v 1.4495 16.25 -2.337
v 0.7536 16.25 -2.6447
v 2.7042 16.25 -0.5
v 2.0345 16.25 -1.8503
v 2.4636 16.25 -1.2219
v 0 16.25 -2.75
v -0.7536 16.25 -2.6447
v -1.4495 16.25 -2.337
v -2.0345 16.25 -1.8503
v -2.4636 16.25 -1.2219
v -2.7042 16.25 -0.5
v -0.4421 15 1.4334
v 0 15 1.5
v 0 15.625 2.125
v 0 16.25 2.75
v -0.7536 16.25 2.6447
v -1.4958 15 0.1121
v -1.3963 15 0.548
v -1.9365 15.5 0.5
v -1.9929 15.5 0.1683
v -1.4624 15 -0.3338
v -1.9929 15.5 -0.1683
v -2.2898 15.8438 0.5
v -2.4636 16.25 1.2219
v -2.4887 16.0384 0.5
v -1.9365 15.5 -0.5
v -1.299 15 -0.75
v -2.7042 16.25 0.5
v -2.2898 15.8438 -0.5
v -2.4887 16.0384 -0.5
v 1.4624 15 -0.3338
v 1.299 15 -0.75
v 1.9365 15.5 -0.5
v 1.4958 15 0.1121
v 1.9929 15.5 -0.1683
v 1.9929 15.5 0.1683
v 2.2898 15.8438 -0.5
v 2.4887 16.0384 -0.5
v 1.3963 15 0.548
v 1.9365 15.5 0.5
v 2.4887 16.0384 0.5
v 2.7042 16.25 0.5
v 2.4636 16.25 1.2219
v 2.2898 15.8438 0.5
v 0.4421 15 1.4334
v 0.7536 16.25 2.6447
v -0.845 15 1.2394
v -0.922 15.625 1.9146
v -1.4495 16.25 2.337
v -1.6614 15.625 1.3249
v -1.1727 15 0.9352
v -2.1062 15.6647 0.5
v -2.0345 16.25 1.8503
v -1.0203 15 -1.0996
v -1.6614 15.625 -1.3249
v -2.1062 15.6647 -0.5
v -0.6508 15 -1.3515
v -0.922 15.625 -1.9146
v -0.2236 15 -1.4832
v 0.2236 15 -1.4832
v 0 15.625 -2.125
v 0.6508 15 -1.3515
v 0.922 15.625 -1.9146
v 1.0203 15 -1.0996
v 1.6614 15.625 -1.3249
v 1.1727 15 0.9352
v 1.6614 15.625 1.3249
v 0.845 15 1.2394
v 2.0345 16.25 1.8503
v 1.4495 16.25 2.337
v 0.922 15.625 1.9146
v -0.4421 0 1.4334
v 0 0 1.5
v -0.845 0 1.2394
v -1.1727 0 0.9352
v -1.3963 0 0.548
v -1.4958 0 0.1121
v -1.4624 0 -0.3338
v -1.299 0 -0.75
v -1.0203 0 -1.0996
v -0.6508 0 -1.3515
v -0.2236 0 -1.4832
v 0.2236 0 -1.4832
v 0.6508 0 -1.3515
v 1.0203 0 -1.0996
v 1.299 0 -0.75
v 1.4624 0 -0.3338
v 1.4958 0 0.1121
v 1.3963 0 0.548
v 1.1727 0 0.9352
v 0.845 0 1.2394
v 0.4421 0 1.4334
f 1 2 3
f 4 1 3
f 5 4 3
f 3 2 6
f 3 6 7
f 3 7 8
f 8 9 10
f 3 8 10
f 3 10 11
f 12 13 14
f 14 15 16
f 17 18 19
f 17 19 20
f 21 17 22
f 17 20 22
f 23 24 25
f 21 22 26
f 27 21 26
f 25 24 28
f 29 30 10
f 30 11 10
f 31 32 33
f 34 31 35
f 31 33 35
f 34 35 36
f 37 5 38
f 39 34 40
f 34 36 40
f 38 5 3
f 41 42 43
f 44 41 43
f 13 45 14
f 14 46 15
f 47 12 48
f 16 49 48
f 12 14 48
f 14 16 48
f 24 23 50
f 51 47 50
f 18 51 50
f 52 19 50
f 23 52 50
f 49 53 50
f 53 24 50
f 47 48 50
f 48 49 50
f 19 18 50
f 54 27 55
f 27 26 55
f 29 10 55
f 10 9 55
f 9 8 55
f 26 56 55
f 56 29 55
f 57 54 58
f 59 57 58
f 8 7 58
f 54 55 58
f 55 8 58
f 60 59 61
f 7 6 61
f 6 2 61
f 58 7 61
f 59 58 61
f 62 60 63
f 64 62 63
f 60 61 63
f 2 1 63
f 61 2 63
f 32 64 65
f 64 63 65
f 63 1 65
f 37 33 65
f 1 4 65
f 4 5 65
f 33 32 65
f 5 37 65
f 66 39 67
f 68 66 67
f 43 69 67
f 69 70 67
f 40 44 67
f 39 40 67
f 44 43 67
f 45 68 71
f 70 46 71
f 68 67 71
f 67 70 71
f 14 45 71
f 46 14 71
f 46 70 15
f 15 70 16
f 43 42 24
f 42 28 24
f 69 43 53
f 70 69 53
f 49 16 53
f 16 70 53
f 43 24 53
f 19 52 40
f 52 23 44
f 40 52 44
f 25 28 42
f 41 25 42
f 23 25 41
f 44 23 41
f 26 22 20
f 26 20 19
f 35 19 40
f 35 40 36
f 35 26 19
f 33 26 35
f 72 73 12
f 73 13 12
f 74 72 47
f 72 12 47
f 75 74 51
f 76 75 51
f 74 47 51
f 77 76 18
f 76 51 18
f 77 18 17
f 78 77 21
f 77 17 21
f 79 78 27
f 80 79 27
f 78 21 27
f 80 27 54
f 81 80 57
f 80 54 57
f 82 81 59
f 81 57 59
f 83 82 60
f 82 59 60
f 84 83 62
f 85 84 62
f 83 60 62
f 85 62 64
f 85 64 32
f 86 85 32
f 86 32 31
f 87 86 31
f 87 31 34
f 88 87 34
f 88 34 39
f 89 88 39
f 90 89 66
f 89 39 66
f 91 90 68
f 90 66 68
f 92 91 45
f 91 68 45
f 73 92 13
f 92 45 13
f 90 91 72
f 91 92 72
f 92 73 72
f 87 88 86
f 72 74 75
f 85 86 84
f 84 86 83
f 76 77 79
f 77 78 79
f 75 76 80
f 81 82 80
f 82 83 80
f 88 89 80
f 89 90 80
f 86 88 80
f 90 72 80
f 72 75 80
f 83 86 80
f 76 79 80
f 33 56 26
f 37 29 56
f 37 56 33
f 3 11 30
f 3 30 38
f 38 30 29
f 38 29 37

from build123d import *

# Parameters (mm, degrees)
SKETCH2_W          = 5.5
SKETCH2_H          = 1
CUT_EXTRUDE1_DEPTH = 0.75


with BuildPart() as part:
    # Sketch1 → Revolve1 (revolve)
    with BuildSketch(Plane(origin=(0, 0, 0), x_dir=(0, 0, -1), z_dir=(1, 0, 0))):
        Polygon((0, 0), (-1.5, 0), (-1.5, 15), (-2.75, 16.25), (0, 16.25), align=None)
    revolve(axis=Axis((0, 16.25, 0), (0, -1, 0)))

    # Sketch2 → Cut-Extrude1 (cut)
    with BuildSketch(Plane(origin=(0, 16.25, 0), x_dir=(1, 0, 0), z_dir=(0, 1, 0))):
        Rectangle(SKETCH2_W, SKETCH2_H)
    extrude(amount=-CUT_EXTRUDE1_DEPTH, mode=Mode.SUBTRACT)


solid = part.part
